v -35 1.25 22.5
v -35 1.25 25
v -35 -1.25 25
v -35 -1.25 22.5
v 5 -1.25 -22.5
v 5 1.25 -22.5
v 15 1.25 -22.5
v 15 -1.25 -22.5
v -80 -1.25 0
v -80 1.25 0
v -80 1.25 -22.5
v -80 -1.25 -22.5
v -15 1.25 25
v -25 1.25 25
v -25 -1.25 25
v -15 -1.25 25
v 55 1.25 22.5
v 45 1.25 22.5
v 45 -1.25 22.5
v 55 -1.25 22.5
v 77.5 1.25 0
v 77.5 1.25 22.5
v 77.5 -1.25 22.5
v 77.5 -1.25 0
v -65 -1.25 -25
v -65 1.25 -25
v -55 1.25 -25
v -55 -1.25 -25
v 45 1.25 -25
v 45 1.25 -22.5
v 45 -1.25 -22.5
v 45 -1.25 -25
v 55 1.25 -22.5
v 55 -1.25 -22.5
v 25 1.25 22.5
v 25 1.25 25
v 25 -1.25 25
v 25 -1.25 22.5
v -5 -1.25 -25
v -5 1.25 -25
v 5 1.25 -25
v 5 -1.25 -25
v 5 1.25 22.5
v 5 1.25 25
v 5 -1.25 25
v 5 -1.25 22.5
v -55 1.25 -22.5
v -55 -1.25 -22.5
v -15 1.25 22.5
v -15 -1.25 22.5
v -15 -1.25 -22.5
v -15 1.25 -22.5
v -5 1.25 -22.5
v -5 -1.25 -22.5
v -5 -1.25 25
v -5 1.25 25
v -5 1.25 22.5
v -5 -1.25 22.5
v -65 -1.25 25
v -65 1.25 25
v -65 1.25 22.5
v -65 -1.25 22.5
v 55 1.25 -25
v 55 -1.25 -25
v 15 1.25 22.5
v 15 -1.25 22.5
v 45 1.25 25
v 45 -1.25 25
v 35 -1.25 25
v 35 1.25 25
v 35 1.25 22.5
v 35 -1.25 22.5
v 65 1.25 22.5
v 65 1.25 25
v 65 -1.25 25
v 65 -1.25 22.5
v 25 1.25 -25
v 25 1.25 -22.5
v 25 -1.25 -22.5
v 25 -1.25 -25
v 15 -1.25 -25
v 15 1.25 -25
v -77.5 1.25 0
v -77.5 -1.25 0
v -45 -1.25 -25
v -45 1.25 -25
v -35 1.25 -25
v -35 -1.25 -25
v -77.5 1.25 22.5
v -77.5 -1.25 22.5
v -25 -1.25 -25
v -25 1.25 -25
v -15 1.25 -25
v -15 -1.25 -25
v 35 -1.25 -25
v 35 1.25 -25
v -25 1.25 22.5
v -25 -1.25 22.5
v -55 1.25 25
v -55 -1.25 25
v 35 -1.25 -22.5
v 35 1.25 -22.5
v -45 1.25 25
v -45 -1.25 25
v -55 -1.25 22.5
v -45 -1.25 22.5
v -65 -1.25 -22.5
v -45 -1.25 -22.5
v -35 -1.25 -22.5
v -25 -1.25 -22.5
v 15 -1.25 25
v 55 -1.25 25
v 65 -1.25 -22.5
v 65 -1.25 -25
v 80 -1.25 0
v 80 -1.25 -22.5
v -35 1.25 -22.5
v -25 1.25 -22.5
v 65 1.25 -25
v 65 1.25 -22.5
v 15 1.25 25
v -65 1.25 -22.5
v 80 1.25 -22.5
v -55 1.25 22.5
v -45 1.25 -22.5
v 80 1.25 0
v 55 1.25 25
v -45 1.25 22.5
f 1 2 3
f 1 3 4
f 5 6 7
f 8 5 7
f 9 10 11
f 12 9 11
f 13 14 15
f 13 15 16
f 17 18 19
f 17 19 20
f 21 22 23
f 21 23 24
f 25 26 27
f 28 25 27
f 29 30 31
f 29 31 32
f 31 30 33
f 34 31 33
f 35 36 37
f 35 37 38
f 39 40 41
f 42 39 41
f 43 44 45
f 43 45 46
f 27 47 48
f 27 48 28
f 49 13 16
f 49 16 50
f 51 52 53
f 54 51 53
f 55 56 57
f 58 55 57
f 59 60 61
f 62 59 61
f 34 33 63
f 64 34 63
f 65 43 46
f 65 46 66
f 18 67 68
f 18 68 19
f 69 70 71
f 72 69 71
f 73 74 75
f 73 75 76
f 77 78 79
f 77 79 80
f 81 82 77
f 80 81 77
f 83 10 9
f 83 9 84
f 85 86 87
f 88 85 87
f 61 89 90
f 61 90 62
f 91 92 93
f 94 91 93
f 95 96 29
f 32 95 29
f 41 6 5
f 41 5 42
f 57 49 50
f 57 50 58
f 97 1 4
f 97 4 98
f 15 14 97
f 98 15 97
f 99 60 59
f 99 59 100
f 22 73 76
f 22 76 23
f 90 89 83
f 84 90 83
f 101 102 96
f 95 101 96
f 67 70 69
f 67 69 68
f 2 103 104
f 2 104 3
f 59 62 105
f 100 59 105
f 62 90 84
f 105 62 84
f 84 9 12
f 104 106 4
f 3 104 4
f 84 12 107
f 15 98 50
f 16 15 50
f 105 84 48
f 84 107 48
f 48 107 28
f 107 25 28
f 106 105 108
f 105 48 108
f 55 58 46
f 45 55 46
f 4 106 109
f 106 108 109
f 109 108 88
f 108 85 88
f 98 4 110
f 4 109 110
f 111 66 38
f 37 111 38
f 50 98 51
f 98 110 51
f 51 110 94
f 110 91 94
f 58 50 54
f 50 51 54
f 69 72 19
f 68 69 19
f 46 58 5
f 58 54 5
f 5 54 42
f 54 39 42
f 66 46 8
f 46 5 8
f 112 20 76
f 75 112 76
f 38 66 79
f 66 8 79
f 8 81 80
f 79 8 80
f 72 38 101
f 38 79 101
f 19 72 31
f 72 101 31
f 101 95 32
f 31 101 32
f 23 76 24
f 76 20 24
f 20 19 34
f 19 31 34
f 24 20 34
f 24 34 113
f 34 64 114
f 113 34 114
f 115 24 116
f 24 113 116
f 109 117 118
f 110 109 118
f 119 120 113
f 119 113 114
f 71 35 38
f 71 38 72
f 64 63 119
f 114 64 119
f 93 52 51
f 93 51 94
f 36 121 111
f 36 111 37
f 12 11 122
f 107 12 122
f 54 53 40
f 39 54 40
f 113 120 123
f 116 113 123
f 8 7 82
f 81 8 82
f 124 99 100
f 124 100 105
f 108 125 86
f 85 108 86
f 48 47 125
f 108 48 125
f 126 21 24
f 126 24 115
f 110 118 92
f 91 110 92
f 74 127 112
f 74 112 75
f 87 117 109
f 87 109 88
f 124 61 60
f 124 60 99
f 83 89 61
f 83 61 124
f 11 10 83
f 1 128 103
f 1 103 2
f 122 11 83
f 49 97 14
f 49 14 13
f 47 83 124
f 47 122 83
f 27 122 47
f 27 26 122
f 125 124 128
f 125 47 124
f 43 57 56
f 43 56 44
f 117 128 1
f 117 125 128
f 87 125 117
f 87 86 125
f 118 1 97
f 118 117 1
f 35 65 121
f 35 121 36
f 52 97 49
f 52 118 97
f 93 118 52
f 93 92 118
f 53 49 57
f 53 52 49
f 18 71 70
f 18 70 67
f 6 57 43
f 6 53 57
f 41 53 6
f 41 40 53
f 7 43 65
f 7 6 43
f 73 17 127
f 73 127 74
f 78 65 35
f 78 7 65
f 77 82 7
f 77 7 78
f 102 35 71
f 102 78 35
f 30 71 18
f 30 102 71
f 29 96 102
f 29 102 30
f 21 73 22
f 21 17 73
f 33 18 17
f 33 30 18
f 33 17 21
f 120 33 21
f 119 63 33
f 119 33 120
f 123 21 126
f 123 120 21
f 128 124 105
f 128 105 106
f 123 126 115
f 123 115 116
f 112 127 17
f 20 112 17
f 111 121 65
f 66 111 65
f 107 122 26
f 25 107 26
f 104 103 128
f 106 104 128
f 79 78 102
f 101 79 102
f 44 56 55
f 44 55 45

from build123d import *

# Parameters (mm, degrees)
SKETCH1_W           = 160
SKETCH1_H           = 50
BOSS_EXTRUDE1_DEPTH = 1.25
SKETCH2_W           = 10
SKETCH2_H           = 2.5
SKETCH2_W_2         = 15
CUT_EXTRUDE1_DEPTH  = 4
SKETCH3_W           = 2.5
SKETCH3_H           = 22.5
CUT_EXTRUDE2_DEPTH  = 84.852549156


with BuildPart() as part:
    # Sketch1 → Boss-Extrude1 (new, symmetric)
    with BuildSketch(Plane(origin=(0, 0, 0), x_dir=(1, 0, 0), z_dir=(0, 1, 0))):
        Rectangle(SKETCH1_W, SKETCH1_H)
    extrude(amount=BOSS_EXTRUDE1_DEPTH, both=True)

    # Sketch2 → Cut-Extrude1 (cut)
    with BuildSketch(Plane(origin=(0, 1.25, 0), x_dir=(1, 0, 0), z_dir=(0, 1, 0))):
        with Locations((30, 23.75)):
            Rectangle(SKETCH2_W, SKETCH2_H)
        with Locations((10, 23.75)):
            Rectangle(SKETCH2_W, SKETCH2_H)
        with Locations((10, -23.75)):
            Rectangle(SKETCH2_W, SKETCH2_H)
        with Locations((30, -23.75)):
            Rectangle(SKETCH2_W, SKETCH2_H)
        with Locations((50, 23.75)):
            Rectangle(SKETCH2_W, SKETCH2_H)
        with Locations((50, -23.75)):
            Rectangle(SKETCH2_W, SKETCH2_H)
        with Locations((-10, 23.75)):
            Rectangle(SKETCH2_W, SKETCH2_H)
        with Locations((-10, -23.75)):
            Rectangle(SKETCH2_W, SKETCH2_H)
        with Locations((-30, 23.75)):
            Rectangle(SKETCH2_W, SKETCH2_H)
        with Locations((-30, -23.75)):
            Rectangle(SKETCH2_W, SKETCH2_H)
        with Locations((-50, 23.75)):
            Rectangle(SKETCH2_W, SKETCH2_H)
        with Locations((-50, -23.75)):
            Rectangle(SKETCH2_W, SKETCH2_H)
        with Locations((72.5, 23.75)):
            Rectangle(SKETCH2_W_2, SKETCH2_H)
        with Locations((72.5, -23.75)):
            Rectangle(SKETCH2_W_2, SKETCH2_H)
        with Locations((-72.5, 23.75)):
            Rectangle(SKETCH2_W_2, SKETCH2_H)
        with Locations((-72.5, -23.75)):
            Rectangle(SKETCH2_W_2, SKETCH2_H)
    extrude(amount=-CUT_EXTRUDE1_DEPTH, mode=Mode.SUBTRACT)

    # Sketch3 → Cut-Extrude2 (cut, through all)
    with BuildSketch(Plane(origin=(0, 1.25, 0), x_dir=(1, 0, 0), z_dir=(0, 1, 0))):
        with Locations((78.75, -11.25)):
            Rectangle(SKETCH3_W, SKETCH3_H)
        with Locations((-78.75, -11.25)):
            Rectangle(SKETCH3_W, SKETCH3_H)
    extrude(amount=-CUT_EXTRUDE2_DEPTH, mode=Mode.SUBTRACT)


solid = part.part
